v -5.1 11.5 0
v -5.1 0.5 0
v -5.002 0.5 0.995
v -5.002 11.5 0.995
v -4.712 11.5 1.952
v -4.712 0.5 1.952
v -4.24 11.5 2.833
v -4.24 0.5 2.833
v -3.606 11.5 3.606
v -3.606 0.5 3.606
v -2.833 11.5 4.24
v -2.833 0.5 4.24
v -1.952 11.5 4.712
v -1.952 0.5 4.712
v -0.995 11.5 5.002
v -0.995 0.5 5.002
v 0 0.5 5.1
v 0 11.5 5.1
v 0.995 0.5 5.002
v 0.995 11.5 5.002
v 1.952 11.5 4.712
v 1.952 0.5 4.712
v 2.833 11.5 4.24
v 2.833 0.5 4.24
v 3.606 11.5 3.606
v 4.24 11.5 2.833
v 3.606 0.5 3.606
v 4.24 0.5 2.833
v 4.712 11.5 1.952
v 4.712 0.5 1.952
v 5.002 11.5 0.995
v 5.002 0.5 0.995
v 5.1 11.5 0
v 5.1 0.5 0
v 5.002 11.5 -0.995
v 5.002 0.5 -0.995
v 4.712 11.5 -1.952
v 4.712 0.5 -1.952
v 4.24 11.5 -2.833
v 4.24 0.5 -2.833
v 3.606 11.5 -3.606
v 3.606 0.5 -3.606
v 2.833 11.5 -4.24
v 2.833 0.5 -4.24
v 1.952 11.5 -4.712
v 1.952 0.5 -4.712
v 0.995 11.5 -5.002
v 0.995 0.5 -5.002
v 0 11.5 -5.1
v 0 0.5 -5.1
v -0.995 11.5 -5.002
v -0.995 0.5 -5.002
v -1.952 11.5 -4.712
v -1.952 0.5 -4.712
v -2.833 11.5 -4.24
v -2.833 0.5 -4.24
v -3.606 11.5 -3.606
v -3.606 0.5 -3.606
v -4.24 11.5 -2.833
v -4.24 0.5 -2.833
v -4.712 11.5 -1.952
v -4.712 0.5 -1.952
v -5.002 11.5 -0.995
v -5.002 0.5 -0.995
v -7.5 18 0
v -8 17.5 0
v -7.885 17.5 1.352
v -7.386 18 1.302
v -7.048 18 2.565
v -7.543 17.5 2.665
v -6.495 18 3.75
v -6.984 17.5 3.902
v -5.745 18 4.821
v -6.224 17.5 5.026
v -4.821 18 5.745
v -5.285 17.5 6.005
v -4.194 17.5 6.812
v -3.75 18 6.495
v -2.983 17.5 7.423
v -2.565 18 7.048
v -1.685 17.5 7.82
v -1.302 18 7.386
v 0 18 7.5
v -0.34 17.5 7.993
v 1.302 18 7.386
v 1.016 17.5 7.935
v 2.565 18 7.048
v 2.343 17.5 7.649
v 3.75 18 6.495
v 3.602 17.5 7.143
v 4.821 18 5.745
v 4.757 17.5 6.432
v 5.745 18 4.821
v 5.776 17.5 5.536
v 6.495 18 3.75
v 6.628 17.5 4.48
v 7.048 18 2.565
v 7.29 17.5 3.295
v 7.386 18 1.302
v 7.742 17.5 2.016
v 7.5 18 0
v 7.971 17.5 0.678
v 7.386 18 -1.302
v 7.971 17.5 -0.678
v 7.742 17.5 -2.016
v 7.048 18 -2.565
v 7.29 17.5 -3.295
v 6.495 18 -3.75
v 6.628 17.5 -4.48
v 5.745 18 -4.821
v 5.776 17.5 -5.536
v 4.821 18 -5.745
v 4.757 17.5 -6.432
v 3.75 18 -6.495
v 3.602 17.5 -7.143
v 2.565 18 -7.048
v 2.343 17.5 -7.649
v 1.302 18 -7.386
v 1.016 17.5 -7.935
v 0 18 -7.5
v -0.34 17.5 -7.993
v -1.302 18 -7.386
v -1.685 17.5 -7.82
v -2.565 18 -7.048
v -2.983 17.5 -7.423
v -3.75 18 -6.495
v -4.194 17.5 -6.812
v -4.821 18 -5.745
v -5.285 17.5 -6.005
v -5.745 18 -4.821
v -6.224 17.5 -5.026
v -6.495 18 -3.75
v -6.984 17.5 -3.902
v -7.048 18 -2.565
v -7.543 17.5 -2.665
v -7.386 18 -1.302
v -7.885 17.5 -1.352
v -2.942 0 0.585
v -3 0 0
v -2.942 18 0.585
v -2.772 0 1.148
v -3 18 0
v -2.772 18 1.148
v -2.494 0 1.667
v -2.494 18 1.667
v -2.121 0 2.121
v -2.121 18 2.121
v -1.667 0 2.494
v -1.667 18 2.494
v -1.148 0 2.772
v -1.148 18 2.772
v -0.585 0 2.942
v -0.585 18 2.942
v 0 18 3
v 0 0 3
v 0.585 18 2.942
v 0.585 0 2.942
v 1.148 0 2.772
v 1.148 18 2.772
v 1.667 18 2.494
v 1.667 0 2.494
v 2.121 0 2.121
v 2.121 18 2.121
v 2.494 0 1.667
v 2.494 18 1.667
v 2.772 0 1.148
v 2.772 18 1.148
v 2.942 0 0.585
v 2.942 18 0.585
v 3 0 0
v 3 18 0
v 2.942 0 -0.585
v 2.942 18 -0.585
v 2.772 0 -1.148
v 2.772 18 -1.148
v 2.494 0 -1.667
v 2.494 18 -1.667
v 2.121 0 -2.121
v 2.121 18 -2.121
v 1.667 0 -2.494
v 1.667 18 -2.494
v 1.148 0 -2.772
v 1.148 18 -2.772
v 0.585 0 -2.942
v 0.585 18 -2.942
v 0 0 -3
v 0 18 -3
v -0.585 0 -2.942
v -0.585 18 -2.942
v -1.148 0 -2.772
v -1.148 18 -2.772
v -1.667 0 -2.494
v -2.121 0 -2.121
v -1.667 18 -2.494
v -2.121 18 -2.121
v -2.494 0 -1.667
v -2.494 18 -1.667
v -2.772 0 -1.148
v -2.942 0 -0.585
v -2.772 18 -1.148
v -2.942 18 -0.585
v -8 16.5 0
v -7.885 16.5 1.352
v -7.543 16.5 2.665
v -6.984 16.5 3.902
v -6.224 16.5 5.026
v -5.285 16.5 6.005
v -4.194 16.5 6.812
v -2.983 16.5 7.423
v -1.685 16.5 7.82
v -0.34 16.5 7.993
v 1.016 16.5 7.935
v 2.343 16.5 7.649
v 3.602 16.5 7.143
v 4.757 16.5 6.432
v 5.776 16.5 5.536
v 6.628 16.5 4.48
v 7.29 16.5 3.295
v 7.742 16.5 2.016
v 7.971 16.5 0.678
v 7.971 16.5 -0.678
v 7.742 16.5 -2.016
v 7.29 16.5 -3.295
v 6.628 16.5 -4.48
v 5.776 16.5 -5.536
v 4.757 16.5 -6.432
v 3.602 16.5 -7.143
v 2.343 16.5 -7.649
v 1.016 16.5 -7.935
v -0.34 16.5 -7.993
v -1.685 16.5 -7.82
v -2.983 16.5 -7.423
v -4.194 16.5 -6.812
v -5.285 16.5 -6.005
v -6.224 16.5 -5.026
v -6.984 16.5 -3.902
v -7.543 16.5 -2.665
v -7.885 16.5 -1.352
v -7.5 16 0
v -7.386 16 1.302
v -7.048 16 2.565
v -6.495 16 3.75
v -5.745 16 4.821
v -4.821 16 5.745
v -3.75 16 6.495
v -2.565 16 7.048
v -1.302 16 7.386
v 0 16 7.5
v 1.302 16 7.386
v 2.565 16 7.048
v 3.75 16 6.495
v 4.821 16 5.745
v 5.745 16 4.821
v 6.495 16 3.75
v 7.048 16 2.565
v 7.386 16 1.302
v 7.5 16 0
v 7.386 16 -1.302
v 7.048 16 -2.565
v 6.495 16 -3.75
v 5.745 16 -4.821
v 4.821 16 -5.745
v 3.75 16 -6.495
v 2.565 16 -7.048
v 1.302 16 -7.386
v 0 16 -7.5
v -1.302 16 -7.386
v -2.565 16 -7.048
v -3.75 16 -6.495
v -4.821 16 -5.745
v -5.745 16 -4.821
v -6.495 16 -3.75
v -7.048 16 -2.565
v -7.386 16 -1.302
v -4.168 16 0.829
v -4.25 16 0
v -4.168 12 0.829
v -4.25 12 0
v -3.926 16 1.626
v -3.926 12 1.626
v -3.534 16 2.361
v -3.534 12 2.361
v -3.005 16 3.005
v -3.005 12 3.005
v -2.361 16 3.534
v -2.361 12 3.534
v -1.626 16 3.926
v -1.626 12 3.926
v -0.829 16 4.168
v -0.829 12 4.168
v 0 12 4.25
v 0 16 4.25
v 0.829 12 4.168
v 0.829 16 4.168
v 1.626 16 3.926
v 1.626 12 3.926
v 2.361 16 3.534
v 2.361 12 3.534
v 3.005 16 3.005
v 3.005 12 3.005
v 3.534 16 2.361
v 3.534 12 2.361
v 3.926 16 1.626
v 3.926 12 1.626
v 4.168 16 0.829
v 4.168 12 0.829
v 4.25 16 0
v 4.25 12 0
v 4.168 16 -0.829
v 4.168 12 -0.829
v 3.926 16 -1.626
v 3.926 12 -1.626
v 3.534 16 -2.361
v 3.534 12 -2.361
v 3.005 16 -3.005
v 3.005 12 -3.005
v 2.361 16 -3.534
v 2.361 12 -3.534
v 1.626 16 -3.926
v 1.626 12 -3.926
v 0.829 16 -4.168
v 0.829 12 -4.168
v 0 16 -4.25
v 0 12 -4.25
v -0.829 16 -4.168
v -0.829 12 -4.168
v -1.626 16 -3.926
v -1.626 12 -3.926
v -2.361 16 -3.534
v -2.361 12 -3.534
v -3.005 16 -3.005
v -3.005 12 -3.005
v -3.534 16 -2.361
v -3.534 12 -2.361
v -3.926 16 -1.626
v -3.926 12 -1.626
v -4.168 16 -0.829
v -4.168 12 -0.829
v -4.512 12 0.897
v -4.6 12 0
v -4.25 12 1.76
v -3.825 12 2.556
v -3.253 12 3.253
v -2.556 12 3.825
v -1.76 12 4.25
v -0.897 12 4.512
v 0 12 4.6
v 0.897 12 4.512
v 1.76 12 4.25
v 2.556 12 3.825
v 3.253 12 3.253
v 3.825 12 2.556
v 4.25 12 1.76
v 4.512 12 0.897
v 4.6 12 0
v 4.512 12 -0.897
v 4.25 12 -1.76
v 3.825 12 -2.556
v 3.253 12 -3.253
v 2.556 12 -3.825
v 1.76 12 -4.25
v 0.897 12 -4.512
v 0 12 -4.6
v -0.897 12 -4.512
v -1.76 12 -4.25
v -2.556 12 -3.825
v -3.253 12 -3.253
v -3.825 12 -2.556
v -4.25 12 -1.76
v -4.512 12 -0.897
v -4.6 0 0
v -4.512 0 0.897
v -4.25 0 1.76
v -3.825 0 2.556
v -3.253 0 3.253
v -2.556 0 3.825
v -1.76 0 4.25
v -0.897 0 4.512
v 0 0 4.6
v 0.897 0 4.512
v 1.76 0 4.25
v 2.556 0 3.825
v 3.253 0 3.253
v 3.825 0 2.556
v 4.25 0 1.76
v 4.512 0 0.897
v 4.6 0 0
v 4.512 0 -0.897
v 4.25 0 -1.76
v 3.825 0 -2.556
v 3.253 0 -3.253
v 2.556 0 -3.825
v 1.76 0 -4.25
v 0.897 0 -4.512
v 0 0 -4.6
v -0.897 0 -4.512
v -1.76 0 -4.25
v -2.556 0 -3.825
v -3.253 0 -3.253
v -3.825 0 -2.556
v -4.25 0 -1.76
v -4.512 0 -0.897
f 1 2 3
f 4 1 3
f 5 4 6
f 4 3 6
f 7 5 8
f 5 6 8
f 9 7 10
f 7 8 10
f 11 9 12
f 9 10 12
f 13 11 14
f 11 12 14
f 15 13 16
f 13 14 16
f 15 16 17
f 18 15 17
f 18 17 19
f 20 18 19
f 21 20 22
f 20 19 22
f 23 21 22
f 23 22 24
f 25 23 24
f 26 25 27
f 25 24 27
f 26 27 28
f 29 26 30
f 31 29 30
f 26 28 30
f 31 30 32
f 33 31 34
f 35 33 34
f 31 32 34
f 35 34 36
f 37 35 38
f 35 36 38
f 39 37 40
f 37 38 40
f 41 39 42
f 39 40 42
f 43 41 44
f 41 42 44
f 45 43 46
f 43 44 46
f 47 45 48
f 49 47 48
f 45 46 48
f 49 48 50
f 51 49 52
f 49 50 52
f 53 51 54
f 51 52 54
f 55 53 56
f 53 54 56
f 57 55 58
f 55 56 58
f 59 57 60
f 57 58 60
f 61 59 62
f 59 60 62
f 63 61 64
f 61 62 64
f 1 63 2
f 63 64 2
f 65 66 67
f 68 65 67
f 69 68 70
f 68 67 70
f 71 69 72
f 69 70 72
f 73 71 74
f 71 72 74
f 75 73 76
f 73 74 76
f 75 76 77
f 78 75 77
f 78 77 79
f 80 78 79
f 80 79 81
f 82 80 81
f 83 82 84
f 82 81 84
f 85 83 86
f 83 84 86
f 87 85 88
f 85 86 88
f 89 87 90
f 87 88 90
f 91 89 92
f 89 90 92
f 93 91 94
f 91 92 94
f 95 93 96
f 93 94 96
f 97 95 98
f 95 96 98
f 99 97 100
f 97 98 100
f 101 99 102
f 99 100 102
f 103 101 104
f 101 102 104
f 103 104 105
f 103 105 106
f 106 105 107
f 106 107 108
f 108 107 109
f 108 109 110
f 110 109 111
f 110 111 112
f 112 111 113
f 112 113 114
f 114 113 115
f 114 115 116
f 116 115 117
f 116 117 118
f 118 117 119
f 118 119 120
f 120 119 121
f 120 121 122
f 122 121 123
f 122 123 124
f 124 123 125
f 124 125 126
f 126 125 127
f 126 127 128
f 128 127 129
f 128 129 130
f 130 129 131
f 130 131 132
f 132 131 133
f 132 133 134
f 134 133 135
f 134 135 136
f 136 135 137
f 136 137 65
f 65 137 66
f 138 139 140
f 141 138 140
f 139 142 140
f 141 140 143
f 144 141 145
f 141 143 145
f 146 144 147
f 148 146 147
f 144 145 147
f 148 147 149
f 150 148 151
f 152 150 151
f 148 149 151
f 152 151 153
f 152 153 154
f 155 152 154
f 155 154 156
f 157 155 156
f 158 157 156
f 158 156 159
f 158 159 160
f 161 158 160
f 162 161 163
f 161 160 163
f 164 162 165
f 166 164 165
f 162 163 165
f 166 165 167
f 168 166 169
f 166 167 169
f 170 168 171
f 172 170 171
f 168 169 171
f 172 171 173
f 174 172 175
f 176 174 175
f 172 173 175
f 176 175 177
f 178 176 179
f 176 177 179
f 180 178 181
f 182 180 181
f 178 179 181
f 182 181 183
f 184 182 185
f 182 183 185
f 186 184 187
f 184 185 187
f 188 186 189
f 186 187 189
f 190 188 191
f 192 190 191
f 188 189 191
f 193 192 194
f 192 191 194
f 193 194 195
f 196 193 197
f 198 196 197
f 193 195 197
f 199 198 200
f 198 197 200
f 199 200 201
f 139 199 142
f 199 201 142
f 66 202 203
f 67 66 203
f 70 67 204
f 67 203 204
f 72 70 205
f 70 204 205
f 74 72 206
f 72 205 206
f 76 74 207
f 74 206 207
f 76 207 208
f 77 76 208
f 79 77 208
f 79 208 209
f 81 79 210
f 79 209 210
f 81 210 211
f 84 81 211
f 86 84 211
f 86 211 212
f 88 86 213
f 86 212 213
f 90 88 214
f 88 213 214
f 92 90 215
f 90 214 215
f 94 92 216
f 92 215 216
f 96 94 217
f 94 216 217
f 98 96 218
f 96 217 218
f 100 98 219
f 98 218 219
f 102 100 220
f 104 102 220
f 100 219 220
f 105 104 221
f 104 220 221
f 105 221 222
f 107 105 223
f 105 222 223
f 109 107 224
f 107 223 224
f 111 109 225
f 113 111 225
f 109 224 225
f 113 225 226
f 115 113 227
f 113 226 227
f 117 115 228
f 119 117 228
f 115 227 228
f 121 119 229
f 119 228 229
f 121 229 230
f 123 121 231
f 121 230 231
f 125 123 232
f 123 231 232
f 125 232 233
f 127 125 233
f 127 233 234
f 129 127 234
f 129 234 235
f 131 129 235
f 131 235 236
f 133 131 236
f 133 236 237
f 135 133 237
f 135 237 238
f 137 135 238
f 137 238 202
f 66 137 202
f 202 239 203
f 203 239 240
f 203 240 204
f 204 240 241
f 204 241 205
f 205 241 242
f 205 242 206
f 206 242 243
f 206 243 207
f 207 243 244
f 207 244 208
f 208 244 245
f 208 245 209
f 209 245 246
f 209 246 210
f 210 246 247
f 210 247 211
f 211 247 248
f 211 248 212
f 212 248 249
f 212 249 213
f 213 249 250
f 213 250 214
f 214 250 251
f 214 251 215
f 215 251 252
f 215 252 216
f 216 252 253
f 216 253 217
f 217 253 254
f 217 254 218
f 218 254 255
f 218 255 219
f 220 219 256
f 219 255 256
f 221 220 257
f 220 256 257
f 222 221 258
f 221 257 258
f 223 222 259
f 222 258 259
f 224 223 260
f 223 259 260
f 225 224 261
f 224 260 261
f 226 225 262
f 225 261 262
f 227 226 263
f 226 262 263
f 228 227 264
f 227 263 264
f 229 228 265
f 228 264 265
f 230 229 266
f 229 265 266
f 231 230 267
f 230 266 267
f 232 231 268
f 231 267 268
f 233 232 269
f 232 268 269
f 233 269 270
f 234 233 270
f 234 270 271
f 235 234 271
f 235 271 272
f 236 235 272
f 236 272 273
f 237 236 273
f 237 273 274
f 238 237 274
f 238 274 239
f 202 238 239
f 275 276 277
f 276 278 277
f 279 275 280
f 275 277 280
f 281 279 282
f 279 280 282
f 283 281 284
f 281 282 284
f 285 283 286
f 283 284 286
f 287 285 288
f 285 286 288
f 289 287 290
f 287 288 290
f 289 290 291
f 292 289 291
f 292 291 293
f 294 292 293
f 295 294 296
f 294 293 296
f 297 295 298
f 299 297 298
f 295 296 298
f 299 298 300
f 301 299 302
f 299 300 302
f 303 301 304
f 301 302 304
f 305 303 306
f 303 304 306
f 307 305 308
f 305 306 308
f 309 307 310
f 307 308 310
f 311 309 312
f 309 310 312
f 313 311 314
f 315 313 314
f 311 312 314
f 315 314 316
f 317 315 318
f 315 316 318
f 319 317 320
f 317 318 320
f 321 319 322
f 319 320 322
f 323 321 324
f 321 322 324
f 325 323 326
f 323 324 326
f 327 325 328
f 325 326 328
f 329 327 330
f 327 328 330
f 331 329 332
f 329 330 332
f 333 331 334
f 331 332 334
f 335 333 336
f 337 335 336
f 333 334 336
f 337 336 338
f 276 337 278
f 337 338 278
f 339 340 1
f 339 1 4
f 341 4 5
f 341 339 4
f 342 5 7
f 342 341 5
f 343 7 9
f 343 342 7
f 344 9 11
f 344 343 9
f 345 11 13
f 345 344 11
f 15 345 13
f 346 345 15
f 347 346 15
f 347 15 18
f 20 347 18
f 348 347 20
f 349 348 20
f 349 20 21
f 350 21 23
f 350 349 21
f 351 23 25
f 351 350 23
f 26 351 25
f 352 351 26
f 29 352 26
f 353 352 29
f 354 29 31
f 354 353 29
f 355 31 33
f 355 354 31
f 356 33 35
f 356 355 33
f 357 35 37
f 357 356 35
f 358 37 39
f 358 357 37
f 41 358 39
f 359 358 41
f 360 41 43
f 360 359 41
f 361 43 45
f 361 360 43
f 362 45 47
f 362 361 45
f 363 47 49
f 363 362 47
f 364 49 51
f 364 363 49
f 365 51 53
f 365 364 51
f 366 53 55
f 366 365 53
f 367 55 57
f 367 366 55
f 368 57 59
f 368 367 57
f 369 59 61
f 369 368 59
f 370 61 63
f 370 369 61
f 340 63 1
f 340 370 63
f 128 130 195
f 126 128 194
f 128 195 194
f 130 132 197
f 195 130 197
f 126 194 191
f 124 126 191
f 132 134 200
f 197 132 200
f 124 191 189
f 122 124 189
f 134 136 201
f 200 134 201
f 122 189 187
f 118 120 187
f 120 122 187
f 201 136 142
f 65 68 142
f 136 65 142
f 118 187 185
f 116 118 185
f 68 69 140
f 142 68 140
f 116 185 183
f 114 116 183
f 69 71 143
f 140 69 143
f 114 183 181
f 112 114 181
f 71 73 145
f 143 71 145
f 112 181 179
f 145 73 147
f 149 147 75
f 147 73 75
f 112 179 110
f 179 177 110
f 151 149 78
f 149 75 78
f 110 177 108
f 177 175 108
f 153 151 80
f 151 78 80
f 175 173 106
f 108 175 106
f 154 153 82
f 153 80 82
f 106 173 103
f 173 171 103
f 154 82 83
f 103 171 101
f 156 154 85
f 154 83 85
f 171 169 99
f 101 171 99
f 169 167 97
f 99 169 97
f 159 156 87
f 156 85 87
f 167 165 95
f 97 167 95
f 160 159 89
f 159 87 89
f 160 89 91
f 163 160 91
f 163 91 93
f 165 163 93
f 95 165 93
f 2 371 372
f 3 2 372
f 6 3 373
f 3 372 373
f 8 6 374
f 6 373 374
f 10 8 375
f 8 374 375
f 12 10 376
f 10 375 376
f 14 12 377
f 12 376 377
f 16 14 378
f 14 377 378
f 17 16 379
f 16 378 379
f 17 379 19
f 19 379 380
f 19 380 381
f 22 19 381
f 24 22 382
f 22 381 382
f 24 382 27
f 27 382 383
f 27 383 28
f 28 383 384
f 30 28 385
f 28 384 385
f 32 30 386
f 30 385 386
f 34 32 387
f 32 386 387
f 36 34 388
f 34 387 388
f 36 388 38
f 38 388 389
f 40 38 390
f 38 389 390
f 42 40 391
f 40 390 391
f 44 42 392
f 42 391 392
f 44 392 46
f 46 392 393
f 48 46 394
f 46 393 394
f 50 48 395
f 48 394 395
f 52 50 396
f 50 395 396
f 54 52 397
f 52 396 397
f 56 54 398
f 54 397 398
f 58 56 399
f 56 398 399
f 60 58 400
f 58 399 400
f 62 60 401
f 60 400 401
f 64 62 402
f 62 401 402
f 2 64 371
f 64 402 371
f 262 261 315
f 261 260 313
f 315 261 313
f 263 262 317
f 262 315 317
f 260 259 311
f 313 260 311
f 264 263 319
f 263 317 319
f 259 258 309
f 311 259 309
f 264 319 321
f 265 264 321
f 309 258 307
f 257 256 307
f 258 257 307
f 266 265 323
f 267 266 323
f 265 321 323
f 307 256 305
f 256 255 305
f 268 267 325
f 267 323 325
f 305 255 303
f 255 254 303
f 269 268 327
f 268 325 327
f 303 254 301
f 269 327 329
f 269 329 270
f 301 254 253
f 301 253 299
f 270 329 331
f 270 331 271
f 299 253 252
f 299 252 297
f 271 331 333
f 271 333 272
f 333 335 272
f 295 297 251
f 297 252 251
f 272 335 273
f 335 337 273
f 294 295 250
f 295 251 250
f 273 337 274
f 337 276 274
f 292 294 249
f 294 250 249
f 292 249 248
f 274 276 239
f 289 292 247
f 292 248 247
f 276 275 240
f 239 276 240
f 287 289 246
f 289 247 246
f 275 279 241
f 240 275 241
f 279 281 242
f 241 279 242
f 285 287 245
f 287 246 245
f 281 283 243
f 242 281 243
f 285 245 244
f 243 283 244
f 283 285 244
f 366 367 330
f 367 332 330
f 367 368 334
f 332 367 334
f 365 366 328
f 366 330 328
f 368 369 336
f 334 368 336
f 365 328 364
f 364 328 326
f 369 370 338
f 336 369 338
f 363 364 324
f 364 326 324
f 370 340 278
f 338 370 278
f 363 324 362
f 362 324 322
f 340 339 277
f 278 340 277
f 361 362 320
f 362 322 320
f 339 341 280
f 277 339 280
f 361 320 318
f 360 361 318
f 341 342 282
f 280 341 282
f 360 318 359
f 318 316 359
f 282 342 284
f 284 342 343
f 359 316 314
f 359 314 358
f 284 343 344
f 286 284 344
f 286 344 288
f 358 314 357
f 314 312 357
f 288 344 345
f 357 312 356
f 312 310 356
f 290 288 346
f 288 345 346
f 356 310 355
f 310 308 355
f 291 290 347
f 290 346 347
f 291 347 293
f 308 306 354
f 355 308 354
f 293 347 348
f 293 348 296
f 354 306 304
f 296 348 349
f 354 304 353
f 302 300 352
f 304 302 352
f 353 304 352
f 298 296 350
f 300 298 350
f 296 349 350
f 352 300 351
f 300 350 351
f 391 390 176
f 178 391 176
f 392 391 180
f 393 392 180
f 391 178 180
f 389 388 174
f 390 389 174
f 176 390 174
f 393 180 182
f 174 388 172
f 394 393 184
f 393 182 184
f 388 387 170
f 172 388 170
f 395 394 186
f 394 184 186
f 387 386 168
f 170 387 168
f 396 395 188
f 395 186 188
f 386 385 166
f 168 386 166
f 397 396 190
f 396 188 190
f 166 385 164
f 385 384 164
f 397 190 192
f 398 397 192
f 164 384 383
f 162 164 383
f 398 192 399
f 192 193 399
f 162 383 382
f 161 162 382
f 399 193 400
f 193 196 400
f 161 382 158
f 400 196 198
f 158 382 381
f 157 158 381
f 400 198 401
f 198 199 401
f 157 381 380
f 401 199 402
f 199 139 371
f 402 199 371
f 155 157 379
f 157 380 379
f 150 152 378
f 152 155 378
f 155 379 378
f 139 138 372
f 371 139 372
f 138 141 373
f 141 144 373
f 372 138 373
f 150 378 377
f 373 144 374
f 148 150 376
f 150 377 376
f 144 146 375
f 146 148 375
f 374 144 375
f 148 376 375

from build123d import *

# Parameters (mm, degrees)
F2_SIZE = 0.5


with BuildPart() as f1:
    # F0 (on Top) → F1 (revolve)
    with BuildSketch(Plane.XY):
        Polygon((-5.1, 12), (-5.1, 0), (-3, 0), (-3, 18), (-8, 18), (-8, 16), (-4.25, 16), (-4.25, 12), align=None)
    revolve(axis=Axis((0, 9, 0), (0, 1, 0)))

    # F2
    f2_edges = [f1.edges().sort_by_distance(p)[0] for p in [
        (8, 18, 0),
        (8, 16, 0),
        (-8, 17, 0),
        (5.1, 12, 0),
        (5.1, 0, 0),
        (-5.1, 6, 0),
    ]]
    chamfer(f2_edges, length=F2_SIZE)


solid = f1.part
